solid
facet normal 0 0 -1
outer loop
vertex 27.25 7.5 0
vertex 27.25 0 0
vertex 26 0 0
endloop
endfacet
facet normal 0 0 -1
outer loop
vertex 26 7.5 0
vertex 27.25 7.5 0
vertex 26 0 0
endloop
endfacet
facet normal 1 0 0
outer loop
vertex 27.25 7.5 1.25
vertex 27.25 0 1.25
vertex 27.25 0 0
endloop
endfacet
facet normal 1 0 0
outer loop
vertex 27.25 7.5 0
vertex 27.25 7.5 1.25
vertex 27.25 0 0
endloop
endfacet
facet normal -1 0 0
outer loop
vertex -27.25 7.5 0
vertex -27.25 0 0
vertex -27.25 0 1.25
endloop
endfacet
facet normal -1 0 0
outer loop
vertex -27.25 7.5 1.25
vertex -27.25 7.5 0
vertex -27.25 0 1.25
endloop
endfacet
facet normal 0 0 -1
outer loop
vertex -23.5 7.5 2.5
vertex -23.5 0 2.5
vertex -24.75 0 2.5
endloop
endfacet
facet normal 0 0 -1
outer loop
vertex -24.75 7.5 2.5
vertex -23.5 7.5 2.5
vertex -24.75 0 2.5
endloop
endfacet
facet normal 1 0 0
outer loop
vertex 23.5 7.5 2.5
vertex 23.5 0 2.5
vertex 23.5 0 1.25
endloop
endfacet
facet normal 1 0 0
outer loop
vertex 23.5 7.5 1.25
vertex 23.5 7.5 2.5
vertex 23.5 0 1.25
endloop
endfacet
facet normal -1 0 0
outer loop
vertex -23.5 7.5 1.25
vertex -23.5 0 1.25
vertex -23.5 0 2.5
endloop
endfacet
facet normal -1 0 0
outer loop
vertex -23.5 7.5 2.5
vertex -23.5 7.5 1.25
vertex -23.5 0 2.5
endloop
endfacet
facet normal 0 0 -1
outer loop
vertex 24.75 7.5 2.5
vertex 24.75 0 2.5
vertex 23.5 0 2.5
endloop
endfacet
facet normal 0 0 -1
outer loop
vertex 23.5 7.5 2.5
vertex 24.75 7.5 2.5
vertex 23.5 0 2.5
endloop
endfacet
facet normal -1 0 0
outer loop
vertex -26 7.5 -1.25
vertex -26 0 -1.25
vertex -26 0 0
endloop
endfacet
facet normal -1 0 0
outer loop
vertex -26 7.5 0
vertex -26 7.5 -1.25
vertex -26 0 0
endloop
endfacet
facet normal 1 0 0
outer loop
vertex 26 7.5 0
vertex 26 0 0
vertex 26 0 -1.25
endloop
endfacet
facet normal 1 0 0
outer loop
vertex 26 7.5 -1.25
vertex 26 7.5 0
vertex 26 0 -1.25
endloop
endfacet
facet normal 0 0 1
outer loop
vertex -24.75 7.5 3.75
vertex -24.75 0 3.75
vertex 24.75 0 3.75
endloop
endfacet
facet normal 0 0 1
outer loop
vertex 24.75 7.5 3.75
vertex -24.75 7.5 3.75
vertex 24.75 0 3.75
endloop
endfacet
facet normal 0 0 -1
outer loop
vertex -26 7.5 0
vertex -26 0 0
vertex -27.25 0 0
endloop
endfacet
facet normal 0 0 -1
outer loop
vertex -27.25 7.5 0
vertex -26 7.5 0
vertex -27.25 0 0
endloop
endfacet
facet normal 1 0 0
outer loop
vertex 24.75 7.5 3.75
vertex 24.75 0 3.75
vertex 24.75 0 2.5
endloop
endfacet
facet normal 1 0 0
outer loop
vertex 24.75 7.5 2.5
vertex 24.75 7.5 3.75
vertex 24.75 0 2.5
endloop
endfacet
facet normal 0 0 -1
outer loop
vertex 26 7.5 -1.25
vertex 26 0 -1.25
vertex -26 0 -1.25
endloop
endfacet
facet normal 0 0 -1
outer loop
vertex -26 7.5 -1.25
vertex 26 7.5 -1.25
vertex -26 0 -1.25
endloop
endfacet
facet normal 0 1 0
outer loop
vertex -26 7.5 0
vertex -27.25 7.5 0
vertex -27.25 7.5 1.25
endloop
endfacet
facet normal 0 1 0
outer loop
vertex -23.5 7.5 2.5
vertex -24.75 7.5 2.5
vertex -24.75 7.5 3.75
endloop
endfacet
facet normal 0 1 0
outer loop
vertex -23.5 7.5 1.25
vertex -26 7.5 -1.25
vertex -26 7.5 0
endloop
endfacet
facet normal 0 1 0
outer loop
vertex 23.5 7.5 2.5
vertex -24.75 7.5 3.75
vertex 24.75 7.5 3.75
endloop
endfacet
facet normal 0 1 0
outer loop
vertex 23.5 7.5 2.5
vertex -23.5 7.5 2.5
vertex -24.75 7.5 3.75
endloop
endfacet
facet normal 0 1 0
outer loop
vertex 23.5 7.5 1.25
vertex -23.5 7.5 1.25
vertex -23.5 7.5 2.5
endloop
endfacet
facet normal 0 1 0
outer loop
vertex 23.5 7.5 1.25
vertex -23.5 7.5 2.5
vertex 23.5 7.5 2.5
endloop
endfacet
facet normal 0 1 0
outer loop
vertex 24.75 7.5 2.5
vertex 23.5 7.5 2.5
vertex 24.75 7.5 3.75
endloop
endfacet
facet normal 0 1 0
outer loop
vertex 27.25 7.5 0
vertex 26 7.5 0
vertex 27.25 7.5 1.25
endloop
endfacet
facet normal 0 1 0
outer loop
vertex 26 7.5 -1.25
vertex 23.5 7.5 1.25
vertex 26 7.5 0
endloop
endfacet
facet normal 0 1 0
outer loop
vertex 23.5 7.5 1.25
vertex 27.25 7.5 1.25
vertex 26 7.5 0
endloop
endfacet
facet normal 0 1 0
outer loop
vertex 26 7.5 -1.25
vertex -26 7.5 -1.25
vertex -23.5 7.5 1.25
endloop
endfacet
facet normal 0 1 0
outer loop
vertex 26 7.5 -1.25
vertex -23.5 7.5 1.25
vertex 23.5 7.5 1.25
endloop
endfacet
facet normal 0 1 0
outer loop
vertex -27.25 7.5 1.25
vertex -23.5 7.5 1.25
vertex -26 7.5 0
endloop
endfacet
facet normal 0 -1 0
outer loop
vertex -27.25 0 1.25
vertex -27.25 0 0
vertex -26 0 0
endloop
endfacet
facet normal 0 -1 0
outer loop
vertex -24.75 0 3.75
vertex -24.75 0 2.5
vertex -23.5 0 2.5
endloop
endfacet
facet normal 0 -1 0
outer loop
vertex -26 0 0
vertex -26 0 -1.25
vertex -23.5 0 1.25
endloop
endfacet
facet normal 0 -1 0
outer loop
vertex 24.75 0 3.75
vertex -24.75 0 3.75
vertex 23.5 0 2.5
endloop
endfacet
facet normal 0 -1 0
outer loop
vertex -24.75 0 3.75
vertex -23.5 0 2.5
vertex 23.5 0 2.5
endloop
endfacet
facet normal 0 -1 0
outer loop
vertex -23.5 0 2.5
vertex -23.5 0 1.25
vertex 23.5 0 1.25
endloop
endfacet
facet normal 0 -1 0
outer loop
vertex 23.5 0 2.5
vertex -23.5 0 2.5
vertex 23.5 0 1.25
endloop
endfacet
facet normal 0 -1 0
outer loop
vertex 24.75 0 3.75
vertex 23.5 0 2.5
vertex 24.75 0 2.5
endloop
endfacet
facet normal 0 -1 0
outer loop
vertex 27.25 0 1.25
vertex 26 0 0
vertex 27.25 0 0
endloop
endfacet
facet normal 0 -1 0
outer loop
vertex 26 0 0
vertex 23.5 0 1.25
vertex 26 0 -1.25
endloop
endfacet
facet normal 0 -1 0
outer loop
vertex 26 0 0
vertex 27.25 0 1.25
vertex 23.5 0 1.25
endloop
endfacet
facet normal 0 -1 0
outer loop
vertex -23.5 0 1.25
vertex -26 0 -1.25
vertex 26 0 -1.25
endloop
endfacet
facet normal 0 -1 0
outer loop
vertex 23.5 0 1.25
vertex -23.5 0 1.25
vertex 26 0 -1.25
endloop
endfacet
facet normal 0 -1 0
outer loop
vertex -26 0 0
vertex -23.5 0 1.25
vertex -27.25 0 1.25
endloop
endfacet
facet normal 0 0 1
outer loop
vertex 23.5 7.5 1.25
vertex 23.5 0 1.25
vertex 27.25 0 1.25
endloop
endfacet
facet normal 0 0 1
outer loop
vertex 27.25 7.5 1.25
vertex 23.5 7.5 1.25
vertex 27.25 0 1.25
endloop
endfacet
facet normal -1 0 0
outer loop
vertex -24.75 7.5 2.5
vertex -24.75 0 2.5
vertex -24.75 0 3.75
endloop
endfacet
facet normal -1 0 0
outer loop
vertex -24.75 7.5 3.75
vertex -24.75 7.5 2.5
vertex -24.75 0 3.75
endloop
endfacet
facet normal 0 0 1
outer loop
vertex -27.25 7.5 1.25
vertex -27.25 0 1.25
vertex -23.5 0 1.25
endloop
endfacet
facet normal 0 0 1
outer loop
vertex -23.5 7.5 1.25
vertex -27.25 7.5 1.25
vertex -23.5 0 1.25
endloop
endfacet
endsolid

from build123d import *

# Parameters (mm, degrees)
TAPA_CAJA_PLACAS_SALIENTE_DEPTH = 7.5


with BuildPart() as part:
    # Tapa-Caja-Placas-Croquis → Tapa-Caja-Placas-Saliente (new body)
    with BuildSketch(Plane(origin=(0, 0, 0), x_dir=(1, 0, 0), z_dir=(0, 1, 0))):
        Polygon((-26, -1.25), (-23.5, -1.25), (-23.5, -2.5), (-24.75, -2.5), (-24.75, -3.75), (-23.5, -3.75), (23.5, -3.75), (24.75, -3.75), (24.75, -2.5), (23.5, -2.5), (23.5, -1.25), (26, -1.25), (27.25, -1.25), (27.25, 0), (26, 0), (26, 1.25), (-26, 1.25), (-26, 0), (-27.25, 0), (-27.25, -1.25), align=None)
    extrude(amount=TAPA_CAJA_PLACAS_SALIENTE_DEPTH)


solid = part.part
